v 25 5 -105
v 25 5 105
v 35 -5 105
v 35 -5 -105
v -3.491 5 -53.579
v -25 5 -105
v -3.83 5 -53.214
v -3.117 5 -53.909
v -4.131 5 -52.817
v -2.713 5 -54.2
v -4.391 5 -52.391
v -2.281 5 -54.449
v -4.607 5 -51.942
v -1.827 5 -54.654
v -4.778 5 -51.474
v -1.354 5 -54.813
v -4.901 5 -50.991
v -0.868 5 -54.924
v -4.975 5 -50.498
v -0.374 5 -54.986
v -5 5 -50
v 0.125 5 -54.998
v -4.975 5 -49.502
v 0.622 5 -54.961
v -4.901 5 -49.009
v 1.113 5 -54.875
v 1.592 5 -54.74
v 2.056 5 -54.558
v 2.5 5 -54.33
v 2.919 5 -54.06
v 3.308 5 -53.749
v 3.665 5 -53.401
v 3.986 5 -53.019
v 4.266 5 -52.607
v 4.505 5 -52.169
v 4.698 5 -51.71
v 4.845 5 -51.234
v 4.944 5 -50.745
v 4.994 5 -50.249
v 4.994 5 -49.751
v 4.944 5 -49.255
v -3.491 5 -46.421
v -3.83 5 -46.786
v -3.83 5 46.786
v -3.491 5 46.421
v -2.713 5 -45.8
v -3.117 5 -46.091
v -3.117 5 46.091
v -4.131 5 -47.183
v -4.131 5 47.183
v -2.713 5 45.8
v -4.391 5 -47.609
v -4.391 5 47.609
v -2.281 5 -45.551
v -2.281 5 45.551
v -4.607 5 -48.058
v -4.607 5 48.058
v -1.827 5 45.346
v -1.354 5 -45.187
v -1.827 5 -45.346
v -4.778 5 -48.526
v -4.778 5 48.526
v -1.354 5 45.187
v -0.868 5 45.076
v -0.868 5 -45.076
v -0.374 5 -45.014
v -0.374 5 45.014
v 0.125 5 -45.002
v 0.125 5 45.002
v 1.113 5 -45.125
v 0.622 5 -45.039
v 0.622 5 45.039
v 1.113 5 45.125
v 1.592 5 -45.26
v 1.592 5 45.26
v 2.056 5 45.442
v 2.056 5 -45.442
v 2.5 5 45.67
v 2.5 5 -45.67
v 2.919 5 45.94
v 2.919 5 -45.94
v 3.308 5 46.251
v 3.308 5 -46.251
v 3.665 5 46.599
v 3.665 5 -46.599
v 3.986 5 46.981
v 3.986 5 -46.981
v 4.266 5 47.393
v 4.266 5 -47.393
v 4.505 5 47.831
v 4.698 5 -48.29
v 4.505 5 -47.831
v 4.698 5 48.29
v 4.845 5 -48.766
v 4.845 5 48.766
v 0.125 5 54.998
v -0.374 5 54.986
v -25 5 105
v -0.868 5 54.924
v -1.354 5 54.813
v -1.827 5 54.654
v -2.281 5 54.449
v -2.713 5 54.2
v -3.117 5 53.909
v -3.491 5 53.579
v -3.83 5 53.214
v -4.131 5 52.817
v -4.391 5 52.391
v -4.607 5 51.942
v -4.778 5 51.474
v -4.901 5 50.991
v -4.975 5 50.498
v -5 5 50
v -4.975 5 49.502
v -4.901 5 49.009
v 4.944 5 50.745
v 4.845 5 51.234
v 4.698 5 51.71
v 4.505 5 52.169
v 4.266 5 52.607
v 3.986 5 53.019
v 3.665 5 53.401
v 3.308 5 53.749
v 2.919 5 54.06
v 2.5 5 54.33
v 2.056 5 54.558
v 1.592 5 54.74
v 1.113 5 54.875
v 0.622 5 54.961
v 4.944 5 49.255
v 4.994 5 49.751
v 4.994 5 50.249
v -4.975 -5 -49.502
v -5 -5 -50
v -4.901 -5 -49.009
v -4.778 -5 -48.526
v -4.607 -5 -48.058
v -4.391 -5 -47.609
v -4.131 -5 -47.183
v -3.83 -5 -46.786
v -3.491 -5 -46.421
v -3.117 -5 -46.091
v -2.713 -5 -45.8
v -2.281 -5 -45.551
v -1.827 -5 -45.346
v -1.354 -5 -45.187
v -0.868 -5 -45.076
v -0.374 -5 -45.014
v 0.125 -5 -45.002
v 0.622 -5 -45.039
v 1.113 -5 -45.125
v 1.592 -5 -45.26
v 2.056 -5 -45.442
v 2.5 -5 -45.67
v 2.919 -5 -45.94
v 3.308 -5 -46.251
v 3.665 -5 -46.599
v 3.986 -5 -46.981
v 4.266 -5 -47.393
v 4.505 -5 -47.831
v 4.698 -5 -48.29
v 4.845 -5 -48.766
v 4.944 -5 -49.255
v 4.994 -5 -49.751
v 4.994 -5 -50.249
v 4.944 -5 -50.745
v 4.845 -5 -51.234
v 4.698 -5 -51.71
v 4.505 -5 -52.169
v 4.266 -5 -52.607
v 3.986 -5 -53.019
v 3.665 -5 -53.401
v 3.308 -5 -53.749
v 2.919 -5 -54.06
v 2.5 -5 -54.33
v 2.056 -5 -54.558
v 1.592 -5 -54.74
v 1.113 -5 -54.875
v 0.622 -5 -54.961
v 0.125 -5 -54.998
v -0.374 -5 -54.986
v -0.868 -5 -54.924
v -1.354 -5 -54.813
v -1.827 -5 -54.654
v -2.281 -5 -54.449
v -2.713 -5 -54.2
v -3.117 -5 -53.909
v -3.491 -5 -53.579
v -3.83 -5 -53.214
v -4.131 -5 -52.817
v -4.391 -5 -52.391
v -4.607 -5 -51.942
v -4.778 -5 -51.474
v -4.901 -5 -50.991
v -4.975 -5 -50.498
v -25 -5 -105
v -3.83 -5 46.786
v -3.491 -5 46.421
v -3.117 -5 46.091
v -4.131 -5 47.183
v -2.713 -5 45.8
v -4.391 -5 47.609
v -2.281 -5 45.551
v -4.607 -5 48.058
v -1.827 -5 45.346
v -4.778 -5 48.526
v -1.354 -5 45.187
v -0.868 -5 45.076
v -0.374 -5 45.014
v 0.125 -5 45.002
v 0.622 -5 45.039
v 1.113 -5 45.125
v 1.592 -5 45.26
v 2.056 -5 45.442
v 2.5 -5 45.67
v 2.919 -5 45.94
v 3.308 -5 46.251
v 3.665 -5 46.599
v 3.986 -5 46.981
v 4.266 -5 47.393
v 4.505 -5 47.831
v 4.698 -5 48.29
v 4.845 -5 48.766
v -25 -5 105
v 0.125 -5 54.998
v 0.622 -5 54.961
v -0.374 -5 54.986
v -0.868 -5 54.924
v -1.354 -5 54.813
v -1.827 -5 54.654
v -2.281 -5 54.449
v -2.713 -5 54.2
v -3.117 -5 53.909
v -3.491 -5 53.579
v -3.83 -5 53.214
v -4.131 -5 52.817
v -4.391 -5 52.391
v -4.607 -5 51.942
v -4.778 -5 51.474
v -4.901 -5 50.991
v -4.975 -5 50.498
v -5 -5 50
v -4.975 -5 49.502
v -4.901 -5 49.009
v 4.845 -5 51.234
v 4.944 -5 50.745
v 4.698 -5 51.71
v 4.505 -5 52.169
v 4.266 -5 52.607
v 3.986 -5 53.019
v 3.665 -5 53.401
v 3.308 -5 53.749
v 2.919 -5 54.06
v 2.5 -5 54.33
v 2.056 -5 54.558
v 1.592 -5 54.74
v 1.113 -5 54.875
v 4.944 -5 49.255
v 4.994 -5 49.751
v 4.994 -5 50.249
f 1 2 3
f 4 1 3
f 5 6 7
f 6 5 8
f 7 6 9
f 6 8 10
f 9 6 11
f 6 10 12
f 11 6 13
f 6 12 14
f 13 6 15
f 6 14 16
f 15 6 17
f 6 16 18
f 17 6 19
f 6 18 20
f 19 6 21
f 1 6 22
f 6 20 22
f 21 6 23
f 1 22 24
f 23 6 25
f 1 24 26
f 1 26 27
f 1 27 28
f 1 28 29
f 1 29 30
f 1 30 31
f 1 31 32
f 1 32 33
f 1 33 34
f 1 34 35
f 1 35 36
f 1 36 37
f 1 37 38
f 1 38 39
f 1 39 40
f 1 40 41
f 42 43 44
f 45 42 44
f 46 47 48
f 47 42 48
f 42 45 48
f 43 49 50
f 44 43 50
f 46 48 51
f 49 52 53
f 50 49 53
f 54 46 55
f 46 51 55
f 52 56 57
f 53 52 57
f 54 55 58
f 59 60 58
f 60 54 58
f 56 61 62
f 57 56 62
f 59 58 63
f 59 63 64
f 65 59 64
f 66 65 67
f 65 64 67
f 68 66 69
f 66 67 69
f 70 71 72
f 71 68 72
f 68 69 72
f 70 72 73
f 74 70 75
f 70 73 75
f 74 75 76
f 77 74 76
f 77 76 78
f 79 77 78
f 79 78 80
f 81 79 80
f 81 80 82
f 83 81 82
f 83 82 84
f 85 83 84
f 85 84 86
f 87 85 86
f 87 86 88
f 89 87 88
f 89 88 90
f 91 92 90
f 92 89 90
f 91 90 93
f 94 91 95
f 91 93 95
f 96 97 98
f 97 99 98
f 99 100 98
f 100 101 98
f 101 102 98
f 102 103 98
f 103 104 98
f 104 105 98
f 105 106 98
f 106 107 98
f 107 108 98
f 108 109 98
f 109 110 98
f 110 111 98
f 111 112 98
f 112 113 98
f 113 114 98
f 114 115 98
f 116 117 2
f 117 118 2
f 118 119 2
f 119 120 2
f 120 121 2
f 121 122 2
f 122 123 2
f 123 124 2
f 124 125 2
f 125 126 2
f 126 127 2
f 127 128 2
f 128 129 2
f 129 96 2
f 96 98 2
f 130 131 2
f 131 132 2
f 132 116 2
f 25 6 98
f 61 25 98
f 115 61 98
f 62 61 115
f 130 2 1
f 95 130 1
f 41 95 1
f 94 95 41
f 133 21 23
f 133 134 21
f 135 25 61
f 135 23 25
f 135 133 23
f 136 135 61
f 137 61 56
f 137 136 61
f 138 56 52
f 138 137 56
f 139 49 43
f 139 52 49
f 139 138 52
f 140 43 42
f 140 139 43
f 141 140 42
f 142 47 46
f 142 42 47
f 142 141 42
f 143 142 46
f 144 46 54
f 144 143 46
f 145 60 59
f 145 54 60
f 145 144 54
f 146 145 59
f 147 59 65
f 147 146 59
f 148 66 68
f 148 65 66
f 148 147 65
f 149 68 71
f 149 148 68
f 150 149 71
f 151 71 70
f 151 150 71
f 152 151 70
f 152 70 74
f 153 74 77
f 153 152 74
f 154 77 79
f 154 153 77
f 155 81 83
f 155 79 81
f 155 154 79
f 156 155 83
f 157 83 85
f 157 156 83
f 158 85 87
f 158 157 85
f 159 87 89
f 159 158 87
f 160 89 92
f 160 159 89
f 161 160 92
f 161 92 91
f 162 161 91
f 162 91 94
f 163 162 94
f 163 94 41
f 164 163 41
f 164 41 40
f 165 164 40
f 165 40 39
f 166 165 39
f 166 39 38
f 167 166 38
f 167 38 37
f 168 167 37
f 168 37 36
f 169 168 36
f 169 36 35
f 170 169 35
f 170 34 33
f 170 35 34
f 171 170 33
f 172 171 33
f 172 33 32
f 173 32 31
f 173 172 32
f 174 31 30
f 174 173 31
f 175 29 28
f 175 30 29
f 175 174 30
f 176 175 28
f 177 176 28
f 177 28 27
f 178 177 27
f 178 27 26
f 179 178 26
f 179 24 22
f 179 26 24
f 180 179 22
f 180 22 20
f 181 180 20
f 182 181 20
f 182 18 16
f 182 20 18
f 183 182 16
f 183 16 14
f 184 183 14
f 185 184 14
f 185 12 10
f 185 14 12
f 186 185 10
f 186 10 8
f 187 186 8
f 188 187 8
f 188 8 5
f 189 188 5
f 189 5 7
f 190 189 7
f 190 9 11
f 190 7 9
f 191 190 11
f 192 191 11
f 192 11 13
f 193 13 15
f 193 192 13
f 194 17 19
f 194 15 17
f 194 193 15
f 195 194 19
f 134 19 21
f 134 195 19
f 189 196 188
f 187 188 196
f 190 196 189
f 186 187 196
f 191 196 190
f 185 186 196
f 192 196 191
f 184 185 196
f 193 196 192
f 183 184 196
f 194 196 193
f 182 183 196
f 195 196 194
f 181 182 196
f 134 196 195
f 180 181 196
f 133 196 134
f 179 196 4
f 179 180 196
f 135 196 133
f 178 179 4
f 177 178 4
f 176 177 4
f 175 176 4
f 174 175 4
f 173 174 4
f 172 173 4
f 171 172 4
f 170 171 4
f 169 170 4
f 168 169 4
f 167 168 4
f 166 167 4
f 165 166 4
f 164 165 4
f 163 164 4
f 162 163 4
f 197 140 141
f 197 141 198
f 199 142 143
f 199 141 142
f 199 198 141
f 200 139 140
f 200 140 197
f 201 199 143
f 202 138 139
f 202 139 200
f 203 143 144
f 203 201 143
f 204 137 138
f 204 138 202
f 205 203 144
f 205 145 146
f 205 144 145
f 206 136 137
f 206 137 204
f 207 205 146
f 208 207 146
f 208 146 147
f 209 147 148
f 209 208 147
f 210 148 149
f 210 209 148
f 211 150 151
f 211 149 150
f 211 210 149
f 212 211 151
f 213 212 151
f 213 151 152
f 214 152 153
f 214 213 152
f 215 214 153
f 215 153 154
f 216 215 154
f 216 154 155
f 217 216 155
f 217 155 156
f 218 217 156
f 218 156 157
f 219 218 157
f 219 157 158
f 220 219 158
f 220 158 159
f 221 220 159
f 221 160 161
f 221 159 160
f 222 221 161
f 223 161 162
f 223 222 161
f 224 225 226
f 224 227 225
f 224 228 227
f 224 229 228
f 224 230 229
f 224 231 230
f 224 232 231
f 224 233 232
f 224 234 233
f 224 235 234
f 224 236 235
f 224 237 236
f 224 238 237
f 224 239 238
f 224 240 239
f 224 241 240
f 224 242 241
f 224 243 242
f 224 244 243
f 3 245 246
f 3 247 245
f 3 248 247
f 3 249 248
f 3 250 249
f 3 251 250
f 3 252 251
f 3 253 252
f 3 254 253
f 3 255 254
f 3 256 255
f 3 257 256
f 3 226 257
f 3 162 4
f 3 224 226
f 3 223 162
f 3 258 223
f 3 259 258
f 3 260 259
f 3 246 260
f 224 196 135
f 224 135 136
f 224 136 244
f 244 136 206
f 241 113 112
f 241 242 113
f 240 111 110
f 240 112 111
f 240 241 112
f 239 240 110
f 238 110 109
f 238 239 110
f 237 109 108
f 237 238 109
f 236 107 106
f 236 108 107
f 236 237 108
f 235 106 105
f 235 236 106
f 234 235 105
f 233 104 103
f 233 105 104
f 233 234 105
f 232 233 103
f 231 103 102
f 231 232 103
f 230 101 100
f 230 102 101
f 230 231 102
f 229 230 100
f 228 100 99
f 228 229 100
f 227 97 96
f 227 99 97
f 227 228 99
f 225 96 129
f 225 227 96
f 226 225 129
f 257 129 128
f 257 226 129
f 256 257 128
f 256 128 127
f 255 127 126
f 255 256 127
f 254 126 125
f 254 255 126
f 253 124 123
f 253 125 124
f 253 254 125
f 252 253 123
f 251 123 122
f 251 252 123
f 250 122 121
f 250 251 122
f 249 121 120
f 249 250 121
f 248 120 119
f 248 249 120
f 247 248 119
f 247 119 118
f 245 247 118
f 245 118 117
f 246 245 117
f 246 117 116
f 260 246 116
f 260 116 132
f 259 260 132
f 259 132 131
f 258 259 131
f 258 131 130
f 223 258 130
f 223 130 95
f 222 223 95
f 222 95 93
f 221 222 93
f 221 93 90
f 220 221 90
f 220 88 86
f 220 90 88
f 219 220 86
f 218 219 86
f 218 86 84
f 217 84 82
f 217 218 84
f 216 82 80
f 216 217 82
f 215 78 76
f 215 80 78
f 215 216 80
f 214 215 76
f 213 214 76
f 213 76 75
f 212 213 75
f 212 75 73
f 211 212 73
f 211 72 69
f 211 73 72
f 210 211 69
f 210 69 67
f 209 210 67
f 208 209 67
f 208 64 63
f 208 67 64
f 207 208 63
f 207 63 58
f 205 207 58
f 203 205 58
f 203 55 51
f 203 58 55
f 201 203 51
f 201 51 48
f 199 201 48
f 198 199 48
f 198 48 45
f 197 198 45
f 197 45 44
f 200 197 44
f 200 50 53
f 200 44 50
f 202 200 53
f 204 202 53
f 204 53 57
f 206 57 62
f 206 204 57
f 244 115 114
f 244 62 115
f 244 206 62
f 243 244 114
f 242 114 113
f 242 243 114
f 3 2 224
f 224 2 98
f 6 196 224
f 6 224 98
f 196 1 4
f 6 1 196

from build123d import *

# Parameters (mm, degrees)
BOSS_EXTRUDE1_DEPTH     = 105
CUT_EXTRUDE1_DEPTH      = 50
CUT_EXTRUDE1_DEPTH_BACK = 50
SKETCH2_R               = 5


with BuildPart() as part:
    # Sketch1 → Boss-Extrude1 (new, symmetric)
    with BuildSketch(Plane.XY):
        Polygon((25, 5), (35, -5), (25, -5), (-25, -5), (-25, 5), align=None)
    extrude(amount=BOSS_EXTRUDE1_DEPTH, both=True)

    # Sketch2 → Cut-Extrude1 (cut, two sides: drawn at the far end of the back side and taken through both)
    with BuildSketch(Plane(origin=(0, 0, 0), x_dir=(1, 0, 0), z_dir=(0, 1, 0)).offset(-CUT_EXTRUDE1_DEPTH_BACK)):
        with Locations(Location((0, 50, 0), (0, 0, 180))):
            Circle(SKETCH2_R)
        with Locations(Location((0, -50, 0), (0, 0, 180))):
            Circle(SKETCH2_R)
    extrude(amount=CUT_EXTRUDE1_DEPTH + CUT_EXTRUDE1_DEPTH_BACK, mode=Mode.SUBTRACT)


solid = part.part
